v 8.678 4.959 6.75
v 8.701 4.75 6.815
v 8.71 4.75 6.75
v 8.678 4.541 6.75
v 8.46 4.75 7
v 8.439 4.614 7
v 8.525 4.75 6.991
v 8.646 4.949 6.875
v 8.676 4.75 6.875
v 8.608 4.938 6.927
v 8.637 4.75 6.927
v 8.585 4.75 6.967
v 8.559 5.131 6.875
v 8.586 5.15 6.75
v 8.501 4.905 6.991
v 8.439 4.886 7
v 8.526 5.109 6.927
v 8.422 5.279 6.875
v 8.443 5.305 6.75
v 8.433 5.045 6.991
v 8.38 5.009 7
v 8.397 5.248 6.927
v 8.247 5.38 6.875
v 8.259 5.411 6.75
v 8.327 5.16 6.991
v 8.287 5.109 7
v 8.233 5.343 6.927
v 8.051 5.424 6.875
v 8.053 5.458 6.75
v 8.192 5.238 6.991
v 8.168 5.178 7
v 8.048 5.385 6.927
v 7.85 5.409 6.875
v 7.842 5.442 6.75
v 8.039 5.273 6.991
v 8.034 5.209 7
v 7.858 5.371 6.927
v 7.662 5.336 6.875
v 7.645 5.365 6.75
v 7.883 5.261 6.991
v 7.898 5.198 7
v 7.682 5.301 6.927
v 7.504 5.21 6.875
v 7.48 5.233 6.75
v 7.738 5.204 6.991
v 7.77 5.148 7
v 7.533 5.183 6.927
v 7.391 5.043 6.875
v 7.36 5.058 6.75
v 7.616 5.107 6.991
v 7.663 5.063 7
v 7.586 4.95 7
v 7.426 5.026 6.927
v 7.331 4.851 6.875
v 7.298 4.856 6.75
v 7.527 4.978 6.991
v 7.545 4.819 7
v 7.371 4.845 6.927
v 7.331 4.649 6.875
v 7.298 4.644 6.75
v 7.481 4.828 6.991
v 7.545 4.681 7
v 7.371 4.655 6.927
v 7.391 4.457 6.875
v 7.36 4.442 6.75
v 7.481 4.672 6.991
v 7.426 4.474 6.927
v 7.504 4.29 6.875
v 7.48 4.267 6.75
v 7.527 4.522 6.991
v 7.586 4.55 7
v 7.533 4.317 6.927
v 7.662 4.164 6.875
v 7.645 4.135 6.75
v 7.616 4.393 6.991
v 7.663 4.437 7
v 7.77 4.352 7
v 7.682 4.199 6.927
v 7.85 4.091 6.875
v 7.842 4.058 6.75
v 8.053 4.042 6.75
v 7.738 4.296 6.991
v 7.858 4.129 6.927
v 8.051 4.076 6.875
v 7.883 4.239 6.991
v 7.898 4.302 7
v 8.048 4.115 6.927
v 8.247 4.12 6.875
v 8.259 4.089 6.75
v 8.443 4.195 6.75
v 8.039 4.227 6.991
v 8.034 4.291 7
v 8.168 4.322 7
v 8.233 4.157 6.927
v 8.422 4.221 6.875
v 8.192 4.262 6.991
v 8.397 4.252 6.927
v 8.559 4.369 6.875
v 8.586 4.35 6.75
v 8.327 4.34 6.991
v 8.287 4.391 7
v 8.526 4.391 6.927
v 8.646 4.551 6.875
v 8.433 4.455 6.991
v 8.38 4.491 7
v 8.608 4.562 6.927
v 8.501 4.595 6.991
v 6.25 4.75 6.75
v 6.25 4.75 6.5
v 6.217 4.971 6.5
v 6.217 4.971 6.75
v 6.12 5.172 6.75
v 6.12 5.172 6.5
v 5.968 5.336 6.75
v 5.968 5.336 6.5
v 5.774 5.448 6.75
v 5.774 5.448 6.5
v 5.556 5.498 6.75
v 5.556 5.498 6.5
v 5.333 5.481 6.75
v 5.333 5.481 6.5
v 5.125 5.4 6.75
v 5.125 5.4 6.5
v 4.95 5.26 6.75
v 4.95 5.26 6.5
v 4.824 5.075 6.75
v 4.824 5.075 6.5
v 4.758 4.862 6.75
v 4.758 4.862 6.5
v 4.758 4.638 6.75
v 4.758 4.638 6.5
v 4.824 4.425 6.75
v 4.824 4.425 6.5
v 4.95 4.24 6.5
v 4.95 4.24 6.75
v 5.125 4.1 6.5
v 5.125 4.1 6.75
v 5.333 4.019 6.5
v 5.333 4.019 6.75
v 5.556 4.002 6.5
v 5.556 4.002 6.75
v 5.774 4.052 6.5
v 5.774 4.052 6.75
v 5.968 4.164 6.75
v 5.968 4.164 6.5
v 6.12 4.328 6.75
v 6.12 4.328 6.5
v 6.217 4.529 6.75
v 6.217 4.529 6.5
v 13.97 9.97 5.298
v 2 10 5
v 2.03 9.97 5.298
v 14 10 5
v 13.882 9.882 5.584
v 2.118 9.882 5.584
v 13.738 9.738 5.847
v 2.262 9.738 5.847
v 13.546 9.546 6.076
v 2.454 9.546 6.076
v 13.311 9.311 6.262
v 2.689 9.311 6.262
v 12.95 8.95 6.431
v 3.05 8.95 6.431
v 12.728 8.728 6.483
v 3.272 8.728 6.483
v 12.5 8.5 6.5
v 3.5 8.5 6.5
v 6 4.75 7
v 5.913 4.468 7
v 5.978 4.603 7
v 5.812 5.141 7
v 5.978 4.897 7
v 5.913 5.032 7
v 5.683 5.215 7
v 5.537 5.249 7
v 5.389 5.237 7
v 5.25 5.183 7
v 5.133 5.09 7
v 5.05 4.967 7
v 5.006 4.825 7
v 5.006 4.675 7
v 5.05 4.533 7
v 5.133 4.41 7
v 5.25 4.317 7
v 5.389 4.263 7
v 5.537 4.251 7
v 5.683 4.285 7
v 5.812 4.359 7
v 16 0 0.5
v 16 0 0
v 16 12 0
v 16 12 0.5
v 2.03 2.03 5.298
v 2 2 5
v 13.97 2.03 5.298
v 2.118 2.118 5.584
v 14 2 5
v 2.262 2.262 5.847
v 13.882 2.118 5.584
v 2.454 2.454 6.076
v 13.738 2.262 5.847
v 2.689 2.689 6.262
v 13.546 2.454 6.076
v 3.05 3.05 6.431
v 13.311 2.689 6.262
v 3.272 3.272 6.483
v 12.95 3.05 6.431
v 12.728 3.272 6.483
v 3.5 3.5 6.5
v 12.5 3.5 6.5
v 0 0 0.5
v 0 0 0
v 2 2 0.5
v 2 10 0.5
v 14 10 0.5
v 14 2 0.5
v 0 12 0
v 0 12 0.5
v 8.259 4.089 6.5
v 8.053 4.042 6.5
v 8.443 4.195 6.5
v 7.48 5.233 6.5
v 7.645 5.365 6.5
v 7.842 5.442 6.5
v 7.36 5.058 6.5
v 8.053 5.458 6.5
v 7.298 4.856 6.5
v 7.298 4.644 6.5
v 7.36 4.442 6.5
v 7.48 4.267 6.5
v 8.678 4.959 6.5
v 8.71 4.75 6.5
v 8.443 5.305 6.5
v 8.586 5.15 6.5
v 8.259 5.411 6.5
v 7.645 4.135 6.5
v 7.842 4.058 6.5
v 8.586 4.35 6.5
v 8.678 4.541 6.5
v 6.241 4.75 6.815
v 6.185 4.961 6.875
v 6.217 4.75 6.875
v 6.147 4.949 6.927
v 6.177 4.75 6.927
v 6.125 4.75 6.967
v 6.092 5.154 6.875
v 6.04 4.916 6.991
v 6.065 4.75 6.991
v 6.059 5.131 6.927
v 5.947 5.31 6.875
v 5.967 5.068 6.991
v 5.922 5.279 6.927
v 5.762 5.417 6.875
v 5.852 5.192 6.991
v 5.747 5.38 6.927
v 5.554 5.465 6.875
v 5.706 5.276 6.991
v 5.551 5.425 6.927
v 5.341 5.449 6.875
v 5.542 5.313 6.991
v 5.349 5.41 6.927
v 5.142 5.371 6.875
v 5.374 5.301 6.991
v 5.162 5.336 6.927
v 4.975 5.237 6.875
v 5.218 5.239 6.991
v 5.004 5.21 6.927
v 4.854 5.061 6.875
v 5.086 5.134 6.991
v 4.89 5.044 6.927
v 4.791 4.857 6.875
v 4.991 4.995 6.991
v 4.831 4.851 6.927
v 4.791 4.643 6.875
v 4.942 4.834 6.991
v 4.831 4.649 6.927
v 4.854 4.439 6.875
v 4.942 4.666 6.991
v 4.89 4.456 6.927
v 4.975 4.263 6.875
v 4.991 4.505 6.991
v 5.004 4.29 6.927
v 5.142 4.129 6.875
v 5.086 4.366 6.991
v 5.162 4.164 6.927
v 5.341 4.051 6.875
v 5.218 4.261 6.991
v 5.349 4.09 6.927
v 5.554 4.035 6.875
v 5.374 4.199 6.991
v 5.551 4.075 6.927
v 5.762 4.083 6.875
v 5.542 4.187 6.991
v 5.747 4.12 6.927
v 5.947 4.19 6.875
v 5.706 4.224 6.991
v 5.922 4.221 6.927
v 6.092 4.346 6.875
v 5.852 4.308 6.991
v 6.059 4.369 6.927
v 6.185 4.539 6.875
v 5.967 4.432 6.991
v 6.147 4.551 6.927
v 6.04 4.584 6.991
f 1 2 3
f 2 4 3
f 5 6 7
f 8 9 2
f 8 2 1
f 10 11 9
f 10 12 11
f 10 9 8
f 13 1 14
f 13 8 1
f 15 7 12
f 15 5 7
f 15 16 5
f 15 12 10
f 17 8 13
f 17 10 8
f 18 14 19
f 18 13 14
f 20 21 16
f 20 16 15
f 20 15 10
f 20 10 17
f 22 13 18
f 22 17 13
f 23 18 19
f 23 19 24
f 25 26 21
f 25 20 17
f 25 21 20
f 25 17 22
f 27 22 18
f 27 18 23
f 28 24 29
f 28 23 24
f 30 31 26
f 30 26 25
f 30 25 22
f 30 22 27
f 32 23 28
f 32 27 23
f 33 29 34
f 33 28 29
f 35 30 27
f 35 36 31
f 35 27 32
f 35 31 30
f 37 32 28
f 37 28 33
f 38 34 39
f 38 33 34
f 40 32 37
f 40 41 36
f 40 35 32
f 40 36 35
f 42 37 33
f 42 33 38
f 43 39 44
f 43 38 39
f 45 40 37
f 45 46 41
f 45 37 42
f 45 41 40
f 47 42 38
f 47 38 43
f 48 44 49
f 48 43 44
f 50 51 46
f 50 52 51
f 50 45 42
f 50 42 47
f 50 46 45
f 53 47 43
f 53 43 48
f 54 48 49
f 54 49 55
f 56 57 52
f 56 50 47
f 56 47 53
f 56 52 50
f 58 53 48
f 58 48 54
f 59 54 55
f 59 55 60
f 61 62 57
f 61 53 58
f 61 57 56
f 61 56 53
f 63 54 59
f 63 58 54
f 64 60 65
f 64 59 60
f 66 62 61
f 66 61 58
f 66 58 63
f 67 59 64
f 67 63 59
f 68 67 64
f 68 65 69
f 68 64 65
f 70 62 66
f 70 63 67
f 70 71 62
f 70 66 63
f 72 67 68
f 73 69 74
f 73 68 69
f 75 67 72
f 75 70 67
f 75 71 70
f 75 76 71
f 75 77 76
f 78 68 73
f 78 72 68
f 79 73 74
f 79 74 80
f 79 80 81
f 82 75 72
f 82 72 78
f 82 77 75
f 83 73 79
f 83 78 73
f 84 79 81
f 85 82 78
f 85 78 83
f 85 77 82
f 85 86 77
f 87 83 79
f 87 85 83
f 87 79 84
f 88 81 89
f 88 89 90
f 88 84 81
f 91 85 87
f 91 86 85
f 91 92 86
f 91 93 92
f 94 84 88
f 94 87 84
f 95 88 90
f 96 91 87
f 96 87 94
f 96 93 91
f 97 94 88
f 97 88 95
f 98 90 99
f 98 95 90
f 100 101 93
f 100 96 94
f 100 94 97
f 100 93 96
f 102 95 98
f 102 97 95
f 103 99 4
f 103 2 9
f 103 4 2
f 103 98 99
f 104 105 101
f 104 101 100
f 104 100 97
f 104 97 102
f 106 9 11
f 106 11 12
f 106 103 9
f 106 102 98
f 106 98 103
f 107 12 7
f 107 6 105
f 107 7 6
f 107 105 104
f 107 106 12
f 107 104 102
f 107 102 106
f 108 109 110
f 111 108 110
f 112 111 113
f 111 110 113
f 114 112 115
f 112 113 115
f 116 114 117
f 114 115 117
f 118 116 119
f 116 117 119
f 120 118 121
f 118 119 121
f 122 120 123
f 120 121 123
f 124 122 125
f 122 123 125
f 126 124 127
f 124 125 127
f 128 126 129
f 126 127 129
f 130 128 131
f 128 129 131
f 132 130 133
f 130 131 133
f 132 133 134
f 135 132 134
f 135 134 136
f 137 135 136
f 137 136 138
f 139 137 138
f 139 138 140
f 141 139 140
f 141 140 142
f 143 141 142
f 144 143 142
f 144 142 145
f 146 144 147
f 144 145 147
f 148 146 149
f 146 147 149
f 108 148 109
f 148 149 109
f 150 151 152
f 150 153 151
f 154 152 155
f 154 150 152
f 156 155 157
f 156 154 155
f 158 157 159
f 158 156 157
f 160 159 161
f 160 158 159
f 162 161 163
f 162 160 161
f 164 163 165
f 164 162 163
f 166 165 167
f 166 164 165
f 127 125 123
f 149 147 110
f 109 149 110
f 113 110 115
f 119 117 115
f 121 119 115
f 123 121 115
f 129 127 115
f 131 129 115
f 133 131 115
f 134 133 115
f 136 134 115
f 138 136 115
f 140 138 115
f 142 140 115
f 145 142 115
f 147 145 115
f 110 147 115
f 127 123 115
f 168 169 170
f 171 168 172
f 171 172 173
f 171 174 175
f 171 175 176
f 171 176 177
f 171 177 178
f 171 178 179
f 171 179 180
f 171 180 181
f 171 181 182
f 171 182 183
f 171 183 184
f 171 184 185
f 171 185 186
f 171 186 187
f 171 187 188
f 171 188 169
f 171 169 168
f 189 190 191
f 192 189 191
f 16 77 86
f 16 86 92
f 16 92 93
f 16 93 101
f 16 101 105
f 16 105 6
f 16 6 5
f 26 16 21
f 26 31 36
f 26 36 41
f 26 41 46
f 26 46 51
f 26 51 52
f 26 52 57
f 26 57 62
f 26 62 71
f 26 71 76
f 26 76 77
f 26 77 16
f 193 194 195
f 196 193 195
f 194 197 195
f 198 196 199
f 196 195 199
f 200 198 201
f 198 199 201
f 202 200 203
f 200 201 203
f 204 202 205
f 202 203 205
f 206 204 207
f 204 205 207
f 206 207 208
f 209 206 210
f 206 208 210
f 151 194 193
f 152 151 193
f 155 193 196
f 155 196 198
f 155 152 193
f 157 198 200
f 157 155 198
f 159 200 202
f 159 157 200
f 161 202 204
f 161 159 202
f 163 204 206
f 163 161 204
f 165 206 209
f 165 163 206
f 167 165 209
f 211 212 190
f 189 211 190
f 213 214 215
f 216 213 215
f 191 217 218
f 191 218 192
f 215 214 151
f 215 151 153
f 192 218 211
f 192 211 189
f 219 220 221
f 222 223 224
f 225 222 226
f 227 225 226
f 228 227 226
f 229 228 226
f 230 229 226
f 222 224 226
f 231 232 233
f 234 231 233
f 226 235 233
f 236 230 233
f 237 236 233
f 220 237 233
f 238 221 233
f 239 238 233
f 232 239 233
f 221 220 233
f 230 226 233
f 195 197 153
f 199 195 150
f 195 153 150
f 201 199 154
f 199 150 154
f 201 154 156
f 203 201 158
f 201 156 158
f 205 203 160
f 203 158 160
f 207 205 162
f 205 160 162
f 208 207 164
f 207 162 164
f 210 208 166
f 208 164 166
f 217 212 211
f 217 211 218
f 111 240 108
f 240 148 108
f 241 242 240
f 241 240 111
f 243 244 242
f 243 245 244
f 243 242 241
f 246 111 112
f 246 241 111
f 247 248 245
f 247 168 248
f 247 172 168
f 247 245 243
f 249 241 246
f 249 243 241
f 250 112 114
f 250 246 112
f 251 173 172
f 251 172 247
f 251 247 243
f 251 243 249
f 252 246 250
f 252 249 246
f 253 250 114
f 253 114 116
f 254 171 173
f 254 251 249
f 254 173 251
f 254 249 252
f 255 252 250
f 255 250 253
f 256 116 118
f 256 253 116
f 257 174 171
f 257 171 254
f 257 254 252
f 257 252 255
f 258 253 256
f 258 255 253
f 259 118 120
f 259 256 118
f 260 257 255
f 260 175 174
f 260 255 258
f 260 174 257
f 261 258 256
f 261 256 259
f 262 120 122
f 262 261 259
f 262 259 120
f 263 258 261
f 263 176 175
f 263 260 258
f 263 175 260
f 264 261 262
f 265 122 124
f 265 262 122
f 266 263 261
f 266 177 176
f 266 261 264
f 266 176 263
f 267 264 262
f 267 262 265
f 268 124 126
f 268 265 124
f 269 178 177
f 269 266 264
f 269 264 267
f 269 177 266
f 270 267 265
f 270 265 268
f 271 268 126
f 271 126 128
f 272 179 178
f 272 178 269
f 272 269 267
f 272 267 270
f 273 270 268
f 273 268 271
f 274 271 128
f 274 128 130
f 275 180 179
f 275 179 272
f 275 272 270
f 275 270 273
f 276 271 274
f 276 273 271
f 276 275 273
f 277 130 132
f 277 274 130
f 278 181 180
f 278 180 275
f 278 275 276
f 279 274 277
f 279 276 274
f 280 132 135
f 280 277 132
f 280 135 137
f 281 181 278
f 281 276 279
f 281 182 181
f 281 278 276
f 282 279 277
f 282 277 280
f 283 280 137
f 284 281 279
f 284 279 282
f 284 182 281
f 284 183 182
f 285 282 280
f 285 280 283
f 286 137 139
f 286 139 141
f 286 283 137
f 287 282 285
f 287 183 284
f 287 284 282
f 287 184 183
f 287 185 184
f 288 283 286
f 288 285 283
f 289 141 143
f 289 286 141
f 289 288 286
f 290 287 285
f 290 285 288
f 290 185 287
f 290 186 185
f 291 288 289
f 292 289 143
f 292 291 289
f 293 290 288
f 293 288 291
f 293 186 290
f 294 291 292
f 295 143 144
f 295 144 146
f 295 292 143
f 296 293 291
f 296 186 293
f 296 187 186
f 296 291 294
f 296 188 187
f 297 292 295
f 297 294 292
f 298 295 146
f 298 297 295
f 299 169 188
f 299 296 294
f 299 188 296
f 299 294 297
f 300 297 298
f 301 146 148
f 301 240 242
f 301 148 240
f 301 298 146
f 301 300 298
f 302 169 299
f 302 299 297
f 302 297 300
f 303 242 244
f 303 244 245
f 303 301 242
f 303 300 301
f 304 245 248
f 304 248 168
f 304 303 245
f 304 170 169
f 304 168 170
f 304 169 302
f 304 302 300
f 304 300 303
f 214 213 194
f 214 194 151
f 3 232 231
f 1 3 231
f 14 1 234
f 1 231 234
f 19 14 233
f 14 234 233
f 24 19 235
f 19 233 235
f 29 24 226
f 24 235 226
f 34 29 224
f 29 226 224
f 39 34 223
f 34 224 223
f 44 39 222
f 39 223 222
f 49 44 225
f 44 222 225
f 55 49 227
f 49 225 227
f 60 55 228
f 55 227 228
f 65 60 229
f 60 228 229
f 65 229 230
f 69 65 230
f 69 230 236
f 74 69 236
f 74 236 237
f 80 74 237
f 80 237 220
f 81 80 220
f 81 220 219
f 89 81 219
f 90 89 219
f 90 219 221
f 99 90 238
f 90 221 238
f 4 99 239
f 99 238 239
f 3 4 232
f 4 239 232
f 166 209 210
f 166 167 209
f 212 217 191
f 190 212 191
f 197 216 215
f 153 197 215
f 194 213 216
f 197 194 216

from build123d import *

# Parameters (mm, degrees)
SKETCH_W     = 16
SKETCH_H     = 12
PAD_DEPTH    = 0.5
SKETCH001_W  = 12
SKETCH001_H  = 8
PAD001_DEPTH = 6
FILLET_R     = 1.5
SKETCH002_R  = 0.75
PAD002_DEPTH = 0.5
FILLET001_R  = 0.25
SKETCH003_R  = 0.709805
PAD003_DEPTH = 0.5
FILLET002_R  = 0.25


with BuildPart() as pad:
    # Sketch → Pad (new body)
    with BuildSketch(Plane.XY):
        with Locations((8, 6)):
            Rectangle(SKETCH_W, SKETCH_H)
    extrude(amount=PAD_DEPTH)


with BuildPart() as fillet_body:
    # Sketch001 → Pad001 (new body)
    with BuildSketch(Plane.XY.offset(0.5)):
        with Locations((8, 6)):
            Rectangle(SKETCH001_W, SKETCH001_H)
    extrude(amount=PAD001_DEPTH)

    # Fillet
    fillet_edges = [fillet_body.edges().sort_by_distance(p)[0] for p in [
        (8, 2, 6.5),
        (14, 6, 6.5),
        (8, 10, 6.5),
        (2, 6, 6.5),
    ]]
    fillet(fillet_edges, radius=FILLET_R)


with BuildPart() as fillet001:
    # Sketch002 → Pad002 (new body)
    with BuildSketch(Plane.XY.offset(6.5)):
        with Locations((5.5, 4.75)):
            Circle(SKETCH002_R)
    extrude(amount=PAD002_DEPTH)

    # Fillet001
    fillet001_edges = [fillet001.edges().sort_by_distance(p)[0] for p in [
        (4.75, 4.75, 7),
    ]]
    fillet(fillet001_edges, radius=FILLET001_R)


with BuildPart() as fillet002:
    # Sketch003 → Pad003 (new body)
    with BuildSketch(Plane.XY.offset(6.5)):
        with Locations((8, 4.75)):
            Circle(SKETCH003_R)
    extrude(amount=PAD003_DEPTH)

    # Fillet002
    fillet002_edges = [fillet002.edges().sort_by_distance(p)[0] for p in [
        (7.290195, 4.75, 7),
    ]]
    fillet(fillet002_edges, radius=FILLET002_R)


solid = Compound([pad.part, fillet_body.part, fillet001.part, fillet002.part])
